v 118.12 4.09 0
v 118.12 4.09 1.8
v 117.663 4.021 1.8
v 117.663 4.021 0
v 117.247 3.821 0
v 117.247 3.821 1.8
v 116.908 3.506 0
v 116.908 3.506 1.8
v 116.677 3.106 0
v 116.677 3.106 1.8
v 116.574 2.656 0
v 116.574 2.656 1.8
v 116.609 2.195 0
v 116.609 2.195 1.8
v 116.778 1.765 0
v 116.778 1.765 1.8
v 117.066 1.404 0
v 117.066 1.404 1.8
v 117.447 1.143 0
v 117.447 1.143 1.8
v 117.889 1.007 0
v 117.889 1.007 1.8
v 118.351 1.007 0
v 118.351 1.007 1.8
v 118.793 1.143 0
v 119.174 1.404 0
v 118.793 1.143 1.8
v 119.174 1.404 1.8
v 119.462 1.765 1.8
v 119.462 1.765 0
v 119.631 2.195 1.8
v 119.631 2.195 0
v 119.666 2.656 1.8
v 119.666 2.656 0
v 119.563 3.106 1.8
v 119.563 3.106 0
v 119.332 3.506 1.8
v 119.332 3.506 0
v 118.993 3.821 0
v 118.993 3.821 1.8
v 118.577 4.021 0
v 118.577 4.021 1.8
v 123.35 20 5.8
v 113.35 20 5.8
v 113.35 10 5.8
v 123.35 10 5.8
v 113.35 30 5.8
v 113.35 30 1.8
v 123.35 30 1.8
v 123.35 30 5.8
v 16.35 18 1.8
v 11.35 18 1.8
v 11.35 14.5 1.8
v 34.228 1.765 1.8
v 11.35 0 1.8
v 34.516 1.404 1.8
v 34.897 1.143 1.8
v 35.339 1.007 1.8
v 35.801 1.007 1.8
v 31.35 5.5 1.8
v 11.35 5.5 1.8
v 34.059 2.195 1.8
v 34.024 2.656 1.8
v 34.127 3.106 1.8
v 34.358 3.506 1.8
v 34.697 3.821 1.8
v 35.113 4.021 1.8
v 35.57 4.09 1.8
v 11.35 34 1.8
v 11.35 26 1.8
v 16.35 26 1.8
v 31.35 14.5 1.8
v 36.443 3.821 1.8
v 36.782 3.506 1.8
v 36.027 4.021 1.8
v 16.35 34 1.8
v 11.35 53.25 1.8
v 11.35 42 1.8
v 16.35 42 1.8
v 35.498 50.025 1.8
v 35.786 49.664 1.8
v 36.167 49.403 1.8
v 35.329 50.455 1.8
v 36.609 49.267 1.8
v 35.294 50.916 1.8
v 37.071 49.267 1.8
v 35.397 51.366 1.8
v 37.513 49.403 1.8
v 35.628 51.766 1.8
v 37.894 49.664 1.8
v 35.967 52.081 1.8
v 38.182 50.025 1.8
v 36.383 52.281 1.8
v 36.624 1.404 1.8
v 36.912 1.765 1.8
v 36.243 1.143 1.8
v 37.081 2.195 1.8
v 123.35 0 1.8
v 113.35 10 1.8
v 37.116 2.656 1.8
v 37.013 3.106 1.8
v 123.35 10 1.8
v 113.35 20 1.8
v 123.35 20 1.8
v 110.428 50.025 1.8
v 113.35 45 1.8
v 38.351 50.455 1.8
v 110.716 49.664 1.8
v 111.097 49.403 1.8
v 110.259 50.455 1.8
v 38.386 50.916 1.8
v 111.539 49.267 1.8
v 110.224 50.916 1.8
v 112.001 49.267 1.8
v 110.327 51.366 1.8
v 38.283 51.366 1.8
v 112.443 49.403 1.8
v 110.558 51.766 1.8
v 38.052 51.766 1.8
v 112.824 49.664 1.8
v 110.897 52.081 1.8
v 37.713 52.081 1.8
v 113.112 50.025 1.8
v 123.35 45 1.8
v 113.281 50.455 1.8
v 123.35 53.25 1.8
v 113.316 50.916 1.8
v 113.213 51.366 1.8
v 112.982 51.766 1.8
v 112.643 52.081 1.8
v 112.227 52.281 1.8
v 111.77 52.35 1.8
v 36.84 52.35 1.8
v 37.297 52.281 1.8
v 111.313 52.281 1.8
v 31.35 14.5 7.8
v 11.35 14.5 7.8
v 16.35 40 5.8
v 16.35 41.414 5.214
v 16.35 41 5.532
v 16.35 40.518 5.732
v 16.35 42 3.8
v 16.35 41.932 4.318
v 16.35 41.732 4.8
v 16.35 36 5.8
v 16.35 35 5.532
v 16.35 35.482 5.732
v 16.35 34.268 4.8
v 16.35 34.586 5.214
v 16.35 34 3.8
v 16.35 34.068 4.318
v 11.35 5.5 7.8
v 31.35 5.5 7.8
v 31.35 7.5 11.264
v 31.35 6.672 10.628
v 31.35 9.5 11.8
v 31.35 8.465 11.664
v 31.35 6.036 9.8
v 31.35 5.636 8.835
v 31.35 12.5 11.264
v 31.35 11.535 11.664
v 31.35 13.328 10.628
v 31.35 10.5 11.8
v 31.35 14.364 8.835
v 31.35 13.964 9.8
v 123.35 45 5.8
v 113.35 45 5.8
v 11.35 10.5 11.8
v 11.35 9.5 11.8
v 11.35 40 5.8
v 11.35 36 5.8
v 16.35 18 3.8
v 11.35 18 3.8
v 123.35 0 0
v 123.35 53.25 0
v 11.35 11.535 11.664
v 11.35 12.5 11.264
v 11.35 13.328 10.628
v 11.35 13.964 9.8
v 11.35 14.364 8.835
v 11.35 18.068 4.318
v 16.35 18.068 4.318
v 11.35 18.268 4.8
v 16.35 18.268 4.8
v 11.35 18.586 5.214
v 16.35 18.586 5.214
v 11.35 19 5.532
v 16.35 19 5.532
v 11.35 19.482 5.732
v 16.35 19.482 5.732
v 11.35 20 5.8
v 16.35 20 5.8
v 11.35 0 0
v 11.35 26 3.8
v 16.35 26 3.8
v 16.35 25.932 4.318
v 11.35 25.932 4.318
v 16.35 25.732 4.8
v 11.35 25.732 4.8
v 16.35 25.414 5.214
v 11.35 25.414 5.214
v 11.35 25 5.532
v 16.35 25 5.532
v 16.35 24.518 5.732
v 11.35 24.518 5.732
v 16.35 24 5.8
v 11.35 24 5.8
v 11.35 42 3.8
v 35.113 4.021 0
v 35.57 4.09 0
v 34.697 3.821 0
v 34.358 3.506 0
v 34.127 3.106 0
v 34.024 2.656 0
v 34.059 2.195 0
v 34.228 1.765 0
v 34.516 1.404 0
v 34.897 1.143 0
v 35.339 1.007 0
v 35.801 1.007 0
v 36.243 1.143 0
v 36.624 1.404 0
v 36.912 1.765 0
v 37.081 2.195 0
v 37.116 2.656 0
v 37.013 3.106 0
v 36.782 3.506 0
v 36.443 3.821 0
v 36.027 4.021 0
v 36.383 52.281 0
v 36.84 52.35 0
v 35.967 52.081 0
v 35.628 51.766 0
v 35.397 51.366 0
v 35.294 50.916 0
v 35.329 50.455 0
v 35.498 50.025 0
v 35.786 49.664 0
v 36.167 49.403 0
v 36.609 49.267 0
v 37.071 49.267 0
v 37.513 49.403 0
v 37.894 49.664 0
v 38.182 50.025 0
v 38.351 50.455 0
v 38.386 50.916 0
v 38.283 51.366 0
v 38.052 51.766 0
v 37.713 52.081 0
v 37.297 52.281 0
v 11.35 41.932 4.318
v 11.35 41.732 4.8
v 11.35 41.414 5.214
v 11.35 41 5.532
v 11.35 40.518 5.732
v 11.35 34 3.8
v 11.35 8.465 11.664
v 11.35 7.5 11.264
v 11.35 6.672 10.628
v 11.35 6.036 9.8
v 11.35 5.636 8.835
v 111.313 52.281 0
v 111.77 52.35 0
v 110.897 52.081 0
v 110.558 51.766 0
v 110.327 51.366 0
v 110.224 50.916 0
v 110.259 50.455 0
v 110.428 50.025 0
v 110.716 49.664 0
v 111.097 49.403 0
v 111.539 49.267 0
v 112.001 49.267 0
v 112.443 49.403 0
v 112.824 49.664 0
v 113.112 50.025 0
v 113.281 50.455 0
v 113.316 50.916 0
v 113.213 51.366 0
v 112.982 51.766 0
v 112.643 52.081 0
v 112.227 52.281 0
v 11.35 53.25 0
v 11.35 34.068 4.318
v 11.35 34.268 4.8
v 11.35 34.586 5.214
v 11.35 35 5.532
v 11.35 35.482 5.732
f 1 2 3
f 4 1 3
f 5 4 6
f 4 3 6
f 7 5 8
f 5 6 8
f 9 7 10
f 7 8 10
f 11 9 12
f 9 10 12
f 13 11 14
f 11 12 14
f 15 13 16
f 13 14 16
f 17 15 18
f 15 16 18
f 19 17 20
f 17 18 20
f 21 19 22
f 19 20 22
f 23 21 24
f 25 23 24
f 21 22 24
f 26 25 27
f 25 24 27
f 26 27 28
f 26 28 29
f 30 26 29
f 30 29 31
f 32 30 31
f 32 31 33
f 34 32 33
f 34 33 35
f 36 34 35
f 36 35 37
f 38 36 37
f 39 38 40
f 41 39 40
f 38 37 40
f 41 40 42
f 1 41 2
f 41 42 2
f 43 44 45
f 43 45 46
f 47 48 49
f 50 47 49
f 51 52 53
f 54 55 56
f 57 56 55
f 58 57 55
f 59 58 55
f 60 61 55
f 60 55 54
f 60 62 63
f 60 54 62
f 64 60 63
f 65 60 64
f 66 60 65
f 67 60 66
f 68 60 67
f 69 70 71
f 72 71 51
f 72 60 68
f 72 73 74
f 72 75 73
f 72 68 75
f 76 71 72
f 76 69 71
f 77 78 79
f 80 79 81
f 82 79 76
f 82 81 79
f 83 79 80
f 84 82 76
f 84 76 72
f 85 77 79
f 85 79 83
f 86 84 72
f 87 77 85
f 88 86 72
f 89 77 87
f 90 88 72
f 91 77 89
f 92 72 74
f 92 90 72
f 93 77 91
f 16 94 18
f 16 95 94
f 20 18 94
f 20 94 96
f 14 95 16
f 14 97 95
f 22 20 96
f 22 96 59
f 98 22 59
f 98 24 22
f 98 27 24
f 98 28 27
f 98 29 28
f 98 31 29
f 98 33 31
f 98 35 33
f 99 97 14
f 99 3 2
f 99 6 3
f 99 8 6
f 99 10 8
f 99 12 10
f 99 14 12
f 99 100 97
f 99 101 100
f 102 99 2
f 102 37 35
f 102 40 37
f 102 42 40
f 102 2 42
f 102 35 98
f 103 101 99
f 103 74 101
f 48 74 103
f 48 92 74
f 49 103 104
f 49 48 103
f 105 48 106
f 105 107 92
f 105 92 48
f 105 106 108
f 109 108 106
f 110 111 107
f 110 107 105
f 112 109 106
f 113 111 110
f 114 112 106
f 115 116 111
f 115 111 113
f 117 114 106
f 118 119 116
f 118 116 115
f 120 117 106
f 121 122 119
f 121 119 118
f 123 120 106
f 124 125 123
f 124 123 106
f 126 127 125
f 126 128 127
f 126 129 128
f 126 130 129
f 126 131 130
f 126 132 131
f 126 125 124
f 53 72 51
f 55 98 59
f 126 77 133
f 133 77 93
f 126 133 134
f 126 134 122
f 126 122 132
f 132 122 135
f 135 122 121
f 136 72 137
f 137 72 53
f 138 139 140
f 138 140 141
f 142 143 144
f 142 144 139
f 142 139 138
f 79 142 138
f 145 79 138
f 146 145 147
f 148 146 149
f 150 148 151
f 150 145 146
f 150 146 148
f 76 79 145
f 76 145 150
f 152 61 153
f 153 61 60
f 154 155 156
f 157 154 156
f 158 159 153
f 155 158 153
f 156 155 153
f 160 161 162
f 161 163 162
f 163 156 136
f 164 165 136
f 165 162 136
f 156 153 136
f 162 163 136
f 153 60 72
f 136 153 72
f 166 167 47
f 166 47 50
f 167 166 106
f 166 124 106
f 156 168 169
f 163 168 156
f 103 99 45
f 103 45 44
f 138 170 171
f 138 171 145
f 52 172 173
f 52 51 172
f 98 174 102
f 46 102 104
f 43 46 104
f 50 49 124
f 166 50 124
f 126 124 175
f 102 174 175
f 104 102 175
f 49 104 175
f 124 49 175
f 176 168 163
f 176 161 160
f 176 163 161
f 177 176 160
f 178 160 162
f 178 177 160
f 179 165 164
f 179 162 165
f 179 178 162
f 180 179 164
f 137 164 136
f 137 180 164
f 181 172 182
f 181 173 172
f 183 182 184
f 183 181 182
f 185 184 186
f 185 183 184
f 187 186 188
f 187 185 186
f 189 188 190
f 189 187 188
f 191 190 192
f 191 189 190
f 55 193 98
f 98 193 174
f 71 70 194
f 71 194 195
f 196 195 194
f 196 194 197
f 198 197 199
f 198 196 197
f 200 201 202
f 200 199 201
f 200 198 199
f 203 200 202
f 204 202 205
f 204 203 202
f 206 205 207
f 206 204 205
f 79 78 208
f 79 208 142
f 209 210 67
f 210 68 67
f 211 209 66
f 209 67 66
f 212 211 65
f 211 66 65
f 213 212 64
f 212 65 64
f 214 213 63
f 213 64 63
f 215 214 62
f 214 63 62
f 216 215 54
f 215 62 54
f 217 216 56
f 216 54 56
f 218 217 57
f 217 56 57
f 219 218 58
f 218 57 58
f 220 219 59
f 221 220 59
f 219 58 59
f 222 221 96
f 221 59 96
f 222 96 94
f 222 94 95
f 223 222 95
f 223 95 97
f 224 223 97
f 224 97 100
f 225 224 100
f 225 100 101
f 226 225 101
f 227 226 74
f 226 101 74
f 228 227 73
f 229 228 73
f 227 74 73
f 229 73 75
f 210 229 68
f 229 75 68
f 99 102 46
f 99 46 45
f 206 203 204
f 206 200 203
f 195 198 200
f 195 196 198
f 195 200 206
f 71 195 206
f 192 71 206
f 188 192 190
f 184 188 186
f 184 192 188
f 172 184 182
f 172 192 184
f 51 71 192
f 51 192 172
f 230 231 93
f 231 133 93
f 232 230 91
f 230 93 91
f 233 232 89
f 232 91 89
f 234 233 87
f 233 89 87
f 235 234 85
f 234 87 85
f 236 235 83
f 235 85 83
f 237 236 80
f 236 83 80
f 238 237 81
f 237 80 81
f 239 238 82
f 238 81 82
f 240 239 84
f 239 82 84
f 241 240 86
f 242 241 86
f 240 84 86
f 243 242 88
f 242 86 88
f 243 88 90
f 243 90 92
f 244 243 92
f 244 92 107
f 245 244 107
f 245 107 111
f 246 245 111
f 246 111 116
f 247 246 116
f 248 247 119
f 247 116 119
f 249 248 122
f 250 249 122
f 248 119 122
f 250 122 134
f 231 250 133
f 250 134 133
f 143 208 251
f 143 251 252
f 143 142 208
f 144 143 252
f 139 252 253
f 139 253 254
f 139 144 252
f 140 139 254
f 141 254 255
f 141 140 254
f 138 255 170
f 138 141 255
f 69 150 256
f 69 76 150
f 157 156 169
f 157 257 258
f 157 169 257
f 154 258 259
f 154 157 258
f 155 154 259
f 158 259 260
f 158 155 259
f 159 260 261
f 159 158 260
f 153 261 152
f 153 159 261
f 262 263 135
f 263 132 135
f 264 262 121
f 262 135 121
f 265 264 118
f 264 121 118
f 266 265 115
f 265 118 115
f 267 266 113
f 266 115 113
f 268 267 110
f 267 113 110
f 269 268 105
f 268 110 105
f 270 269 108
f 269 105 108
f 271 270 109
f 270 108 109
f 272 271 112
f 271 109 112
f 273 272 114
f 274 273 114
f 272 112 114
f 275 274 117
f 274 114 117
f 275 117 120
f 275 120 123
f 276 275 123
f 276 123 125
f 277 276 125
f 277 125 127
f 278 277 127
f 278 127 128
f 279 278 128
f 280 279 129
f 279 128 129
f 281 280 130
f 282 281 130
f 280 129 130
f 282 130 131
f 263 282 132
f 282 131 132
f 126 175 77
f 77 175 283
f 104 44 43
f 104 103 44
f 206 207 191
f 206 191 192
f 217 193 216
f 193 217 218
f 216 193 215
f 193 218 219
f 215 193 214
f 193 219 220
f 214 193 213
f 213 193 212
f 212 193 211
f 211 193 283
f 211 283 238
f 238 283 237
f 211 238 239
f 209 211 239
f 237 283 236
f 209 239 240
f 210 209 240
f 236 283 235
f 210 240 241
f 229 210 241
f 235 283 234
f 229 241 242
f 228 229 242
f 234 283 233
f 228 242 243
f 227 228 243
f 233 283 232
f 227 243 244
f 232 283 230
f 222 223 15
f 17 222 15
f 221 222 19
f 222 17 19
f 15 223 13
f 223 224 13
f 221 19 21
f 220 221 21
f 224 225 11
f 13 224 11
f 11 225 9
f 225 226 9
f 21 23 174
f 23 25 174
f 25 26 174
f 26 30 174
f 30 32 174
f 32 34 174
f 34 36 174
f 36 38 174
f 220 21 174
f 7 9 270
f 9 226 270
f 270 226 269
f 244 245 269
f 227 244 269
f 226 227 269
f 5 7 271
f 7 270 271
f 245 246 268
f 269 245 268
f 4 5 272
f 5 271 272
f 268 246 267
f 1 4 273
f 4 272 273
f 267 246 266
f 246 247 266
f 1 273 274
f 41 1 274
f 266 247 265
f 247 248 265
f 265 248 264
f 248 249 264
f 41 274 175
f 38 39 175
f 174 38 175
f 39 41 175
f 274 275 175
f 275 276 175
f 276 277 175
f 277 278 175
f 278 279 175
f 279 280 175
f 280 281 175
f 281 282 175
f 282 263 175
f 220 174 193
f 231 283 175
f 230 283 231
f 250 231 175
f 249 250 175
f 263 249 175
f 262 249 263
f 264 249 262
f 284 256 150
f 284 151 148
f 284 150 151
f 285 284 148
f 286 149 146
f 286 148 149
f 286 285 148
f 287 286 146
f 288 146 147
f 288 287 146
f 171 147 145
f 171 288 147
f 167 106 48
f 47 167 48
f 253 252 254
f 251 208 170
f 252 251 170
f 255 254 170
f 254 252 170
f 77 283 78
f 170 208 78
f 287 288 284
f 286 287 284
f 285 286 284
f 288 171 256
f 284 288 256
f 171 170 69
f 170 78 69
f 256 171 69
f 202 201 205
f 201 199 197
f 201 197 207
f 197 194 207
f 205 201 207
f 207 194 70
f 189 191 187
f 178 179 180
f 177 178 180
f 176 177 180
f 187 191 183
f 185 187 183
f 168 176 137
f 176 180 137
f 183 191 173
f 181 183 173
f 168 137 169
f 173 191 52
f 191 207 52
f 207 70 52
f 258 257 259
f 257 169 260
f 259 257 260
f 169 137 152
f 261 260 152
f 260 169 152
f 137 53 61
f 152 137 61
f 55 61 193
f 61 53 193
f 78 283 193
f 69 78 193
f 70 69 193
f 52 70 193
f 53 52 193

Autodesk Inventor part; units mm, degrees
ref_plane "YZ Plane" through (0, 0, 0) normal (1, 0, 0) x (0, 1, 0)
ref_plane "XZ Plane" through (0, 0, 0) normal (0, 1, 0) x (-1, 0, 0)
ref_plane "XY Plane" through (0, 0, 0) normal (0, 0, 1) x (1, 0, 0)
sketch "Sketch1" plane through (0, 0, 0) normal (0, 0, 1) x (1, 0, 0)
  line L0 (11.35, 0) -> (123.35, 0)
  line L1 (123.35, 0) -> (123.35, 53.25)
  line L2 (123.35, 53.25) -> (11.35, 53.25)
  line L3 (11.35, 53.25) -> (11.35, 0)
  line L4 (13.2018, 50.8) -> (120.6255, 50.8) construction
  line L5 (12.1008, 2.54) -> (119.6818, 2.54) construction
  point P0 (0, 0)
  point P1 (0, 0)
  point P2 (36.84, 50.8)
  point P3 (111.77, 50.8)
  point P4 (118.12, 2.54)
  point P5 (35.57, 2.54)
  dimension "d0" = 112
  dimension "d1" = 53.25
  dimension "d2" = 48.26
  dimension "d3" = 2.45
  dimension "d4" = 74.93
  dimension "d5" = 82.55
  dimension "d6" = 6.35
  dimension "d7" = 5.23
  dimension "d38" = 100.42
  dimension "d39" = 1.27
extrude "Extrusion1" add sketch "Sketch1" along normal blind 1.8
hole "Hole1" at (36.84, 50.8, 0) at (111.77, 50.8, 0) at (118.12, 2.54, 0) at (35.57, 2.54, 0) direction (0, 0, 1) diameter 3.1 end through all
sketch "Sketch2" plane through (0, 0, 1.8) normal (0, 0, 1) x (1, 0, 0)
  line L0 (123.35, 0) -> (123.35, 53.25) projected
  line L1 (123.35, 10) -> (113.35, 10)
  line L2 (113.35, 10) -> (113.35, 20)
  line L3 (113.35, 20) -> (123.35, 20)
  line L4 (123.35, 20) -> (123.35, 10)
  line L5 (11.35, 0) -> (123.35, 0) projected
  line L6 (123.35, 45) -> (113.35, 45)
  line L7 (113.35, 45) -> (113.35, 30)
  line L8 (113.35, 30) -> (123.35, 30)
  line L9 (123.35, 30) -> (123.35, 45)
  line L10 (11.35, 53.25) -> (11.35, 0) projected
  line L11 (11.35, 5.5) -> (31.35, 5.5)
  line L12 (31.35, 5.5) -> (31.35, 14.5)
  line L13 (31.35, 14.5) -> (11.35, 14.5)
  line L14 (11.35, 14.5) -> (11.35, 5.5)
  line L15 (11.35, 42) -> (16.35, 42)
  line L16 (16.35, 42) -> (16.35, 34)
  line L17 (16.35, 34) -> (11.35, 34)
  line L18 (11.35, 34) -> (11.35, 42)
  line L19 (11.35, 26) -> (16.35, 26)
  line L20 (16.35, 26) -> (16.35, 18)
  line L21 (16.35, 18) -> (11.35, 18)
  line L22 (11.35, 18) -> (11.35, 26)
  point P0 (0, 0)
  dimension "d17" = 10
  dimension "d18" = 10
  dimension "d19" = 10
  dimension "d20" = 10
  dimension "d21" = 15
  dimension "d22" = 30
  dimension "d23" = 20
  dimension "d24" = 9
  dimension "d25" = 5
  dimension "d26" = 8
  dimension "d27" = 5
  dimension "d28" = 8
  dimension "d29" = 5.5
  dimension "d30" = 18
  dimension "d31" = 34
extrude "Extrusion2" add sketch "Sketch2" along normal blind 4
extrude "Extrusion3" add sketch "Sketch2" along normal blind 10 contours L10 L13 L12 L11
fillet "Fillet1" radius 4 2 edges at (21.35, 14.5, 11.8) (21.35, 5.5, 11.8)
fillet "Fillet2" radius 2 4 edges at (13.85, 26, 5.8) (13.85, 18, 5.8) (13.85, 34, 5.8) (13.85, 42, 5.8)
properties part number "EVAL_ADICUP360"
